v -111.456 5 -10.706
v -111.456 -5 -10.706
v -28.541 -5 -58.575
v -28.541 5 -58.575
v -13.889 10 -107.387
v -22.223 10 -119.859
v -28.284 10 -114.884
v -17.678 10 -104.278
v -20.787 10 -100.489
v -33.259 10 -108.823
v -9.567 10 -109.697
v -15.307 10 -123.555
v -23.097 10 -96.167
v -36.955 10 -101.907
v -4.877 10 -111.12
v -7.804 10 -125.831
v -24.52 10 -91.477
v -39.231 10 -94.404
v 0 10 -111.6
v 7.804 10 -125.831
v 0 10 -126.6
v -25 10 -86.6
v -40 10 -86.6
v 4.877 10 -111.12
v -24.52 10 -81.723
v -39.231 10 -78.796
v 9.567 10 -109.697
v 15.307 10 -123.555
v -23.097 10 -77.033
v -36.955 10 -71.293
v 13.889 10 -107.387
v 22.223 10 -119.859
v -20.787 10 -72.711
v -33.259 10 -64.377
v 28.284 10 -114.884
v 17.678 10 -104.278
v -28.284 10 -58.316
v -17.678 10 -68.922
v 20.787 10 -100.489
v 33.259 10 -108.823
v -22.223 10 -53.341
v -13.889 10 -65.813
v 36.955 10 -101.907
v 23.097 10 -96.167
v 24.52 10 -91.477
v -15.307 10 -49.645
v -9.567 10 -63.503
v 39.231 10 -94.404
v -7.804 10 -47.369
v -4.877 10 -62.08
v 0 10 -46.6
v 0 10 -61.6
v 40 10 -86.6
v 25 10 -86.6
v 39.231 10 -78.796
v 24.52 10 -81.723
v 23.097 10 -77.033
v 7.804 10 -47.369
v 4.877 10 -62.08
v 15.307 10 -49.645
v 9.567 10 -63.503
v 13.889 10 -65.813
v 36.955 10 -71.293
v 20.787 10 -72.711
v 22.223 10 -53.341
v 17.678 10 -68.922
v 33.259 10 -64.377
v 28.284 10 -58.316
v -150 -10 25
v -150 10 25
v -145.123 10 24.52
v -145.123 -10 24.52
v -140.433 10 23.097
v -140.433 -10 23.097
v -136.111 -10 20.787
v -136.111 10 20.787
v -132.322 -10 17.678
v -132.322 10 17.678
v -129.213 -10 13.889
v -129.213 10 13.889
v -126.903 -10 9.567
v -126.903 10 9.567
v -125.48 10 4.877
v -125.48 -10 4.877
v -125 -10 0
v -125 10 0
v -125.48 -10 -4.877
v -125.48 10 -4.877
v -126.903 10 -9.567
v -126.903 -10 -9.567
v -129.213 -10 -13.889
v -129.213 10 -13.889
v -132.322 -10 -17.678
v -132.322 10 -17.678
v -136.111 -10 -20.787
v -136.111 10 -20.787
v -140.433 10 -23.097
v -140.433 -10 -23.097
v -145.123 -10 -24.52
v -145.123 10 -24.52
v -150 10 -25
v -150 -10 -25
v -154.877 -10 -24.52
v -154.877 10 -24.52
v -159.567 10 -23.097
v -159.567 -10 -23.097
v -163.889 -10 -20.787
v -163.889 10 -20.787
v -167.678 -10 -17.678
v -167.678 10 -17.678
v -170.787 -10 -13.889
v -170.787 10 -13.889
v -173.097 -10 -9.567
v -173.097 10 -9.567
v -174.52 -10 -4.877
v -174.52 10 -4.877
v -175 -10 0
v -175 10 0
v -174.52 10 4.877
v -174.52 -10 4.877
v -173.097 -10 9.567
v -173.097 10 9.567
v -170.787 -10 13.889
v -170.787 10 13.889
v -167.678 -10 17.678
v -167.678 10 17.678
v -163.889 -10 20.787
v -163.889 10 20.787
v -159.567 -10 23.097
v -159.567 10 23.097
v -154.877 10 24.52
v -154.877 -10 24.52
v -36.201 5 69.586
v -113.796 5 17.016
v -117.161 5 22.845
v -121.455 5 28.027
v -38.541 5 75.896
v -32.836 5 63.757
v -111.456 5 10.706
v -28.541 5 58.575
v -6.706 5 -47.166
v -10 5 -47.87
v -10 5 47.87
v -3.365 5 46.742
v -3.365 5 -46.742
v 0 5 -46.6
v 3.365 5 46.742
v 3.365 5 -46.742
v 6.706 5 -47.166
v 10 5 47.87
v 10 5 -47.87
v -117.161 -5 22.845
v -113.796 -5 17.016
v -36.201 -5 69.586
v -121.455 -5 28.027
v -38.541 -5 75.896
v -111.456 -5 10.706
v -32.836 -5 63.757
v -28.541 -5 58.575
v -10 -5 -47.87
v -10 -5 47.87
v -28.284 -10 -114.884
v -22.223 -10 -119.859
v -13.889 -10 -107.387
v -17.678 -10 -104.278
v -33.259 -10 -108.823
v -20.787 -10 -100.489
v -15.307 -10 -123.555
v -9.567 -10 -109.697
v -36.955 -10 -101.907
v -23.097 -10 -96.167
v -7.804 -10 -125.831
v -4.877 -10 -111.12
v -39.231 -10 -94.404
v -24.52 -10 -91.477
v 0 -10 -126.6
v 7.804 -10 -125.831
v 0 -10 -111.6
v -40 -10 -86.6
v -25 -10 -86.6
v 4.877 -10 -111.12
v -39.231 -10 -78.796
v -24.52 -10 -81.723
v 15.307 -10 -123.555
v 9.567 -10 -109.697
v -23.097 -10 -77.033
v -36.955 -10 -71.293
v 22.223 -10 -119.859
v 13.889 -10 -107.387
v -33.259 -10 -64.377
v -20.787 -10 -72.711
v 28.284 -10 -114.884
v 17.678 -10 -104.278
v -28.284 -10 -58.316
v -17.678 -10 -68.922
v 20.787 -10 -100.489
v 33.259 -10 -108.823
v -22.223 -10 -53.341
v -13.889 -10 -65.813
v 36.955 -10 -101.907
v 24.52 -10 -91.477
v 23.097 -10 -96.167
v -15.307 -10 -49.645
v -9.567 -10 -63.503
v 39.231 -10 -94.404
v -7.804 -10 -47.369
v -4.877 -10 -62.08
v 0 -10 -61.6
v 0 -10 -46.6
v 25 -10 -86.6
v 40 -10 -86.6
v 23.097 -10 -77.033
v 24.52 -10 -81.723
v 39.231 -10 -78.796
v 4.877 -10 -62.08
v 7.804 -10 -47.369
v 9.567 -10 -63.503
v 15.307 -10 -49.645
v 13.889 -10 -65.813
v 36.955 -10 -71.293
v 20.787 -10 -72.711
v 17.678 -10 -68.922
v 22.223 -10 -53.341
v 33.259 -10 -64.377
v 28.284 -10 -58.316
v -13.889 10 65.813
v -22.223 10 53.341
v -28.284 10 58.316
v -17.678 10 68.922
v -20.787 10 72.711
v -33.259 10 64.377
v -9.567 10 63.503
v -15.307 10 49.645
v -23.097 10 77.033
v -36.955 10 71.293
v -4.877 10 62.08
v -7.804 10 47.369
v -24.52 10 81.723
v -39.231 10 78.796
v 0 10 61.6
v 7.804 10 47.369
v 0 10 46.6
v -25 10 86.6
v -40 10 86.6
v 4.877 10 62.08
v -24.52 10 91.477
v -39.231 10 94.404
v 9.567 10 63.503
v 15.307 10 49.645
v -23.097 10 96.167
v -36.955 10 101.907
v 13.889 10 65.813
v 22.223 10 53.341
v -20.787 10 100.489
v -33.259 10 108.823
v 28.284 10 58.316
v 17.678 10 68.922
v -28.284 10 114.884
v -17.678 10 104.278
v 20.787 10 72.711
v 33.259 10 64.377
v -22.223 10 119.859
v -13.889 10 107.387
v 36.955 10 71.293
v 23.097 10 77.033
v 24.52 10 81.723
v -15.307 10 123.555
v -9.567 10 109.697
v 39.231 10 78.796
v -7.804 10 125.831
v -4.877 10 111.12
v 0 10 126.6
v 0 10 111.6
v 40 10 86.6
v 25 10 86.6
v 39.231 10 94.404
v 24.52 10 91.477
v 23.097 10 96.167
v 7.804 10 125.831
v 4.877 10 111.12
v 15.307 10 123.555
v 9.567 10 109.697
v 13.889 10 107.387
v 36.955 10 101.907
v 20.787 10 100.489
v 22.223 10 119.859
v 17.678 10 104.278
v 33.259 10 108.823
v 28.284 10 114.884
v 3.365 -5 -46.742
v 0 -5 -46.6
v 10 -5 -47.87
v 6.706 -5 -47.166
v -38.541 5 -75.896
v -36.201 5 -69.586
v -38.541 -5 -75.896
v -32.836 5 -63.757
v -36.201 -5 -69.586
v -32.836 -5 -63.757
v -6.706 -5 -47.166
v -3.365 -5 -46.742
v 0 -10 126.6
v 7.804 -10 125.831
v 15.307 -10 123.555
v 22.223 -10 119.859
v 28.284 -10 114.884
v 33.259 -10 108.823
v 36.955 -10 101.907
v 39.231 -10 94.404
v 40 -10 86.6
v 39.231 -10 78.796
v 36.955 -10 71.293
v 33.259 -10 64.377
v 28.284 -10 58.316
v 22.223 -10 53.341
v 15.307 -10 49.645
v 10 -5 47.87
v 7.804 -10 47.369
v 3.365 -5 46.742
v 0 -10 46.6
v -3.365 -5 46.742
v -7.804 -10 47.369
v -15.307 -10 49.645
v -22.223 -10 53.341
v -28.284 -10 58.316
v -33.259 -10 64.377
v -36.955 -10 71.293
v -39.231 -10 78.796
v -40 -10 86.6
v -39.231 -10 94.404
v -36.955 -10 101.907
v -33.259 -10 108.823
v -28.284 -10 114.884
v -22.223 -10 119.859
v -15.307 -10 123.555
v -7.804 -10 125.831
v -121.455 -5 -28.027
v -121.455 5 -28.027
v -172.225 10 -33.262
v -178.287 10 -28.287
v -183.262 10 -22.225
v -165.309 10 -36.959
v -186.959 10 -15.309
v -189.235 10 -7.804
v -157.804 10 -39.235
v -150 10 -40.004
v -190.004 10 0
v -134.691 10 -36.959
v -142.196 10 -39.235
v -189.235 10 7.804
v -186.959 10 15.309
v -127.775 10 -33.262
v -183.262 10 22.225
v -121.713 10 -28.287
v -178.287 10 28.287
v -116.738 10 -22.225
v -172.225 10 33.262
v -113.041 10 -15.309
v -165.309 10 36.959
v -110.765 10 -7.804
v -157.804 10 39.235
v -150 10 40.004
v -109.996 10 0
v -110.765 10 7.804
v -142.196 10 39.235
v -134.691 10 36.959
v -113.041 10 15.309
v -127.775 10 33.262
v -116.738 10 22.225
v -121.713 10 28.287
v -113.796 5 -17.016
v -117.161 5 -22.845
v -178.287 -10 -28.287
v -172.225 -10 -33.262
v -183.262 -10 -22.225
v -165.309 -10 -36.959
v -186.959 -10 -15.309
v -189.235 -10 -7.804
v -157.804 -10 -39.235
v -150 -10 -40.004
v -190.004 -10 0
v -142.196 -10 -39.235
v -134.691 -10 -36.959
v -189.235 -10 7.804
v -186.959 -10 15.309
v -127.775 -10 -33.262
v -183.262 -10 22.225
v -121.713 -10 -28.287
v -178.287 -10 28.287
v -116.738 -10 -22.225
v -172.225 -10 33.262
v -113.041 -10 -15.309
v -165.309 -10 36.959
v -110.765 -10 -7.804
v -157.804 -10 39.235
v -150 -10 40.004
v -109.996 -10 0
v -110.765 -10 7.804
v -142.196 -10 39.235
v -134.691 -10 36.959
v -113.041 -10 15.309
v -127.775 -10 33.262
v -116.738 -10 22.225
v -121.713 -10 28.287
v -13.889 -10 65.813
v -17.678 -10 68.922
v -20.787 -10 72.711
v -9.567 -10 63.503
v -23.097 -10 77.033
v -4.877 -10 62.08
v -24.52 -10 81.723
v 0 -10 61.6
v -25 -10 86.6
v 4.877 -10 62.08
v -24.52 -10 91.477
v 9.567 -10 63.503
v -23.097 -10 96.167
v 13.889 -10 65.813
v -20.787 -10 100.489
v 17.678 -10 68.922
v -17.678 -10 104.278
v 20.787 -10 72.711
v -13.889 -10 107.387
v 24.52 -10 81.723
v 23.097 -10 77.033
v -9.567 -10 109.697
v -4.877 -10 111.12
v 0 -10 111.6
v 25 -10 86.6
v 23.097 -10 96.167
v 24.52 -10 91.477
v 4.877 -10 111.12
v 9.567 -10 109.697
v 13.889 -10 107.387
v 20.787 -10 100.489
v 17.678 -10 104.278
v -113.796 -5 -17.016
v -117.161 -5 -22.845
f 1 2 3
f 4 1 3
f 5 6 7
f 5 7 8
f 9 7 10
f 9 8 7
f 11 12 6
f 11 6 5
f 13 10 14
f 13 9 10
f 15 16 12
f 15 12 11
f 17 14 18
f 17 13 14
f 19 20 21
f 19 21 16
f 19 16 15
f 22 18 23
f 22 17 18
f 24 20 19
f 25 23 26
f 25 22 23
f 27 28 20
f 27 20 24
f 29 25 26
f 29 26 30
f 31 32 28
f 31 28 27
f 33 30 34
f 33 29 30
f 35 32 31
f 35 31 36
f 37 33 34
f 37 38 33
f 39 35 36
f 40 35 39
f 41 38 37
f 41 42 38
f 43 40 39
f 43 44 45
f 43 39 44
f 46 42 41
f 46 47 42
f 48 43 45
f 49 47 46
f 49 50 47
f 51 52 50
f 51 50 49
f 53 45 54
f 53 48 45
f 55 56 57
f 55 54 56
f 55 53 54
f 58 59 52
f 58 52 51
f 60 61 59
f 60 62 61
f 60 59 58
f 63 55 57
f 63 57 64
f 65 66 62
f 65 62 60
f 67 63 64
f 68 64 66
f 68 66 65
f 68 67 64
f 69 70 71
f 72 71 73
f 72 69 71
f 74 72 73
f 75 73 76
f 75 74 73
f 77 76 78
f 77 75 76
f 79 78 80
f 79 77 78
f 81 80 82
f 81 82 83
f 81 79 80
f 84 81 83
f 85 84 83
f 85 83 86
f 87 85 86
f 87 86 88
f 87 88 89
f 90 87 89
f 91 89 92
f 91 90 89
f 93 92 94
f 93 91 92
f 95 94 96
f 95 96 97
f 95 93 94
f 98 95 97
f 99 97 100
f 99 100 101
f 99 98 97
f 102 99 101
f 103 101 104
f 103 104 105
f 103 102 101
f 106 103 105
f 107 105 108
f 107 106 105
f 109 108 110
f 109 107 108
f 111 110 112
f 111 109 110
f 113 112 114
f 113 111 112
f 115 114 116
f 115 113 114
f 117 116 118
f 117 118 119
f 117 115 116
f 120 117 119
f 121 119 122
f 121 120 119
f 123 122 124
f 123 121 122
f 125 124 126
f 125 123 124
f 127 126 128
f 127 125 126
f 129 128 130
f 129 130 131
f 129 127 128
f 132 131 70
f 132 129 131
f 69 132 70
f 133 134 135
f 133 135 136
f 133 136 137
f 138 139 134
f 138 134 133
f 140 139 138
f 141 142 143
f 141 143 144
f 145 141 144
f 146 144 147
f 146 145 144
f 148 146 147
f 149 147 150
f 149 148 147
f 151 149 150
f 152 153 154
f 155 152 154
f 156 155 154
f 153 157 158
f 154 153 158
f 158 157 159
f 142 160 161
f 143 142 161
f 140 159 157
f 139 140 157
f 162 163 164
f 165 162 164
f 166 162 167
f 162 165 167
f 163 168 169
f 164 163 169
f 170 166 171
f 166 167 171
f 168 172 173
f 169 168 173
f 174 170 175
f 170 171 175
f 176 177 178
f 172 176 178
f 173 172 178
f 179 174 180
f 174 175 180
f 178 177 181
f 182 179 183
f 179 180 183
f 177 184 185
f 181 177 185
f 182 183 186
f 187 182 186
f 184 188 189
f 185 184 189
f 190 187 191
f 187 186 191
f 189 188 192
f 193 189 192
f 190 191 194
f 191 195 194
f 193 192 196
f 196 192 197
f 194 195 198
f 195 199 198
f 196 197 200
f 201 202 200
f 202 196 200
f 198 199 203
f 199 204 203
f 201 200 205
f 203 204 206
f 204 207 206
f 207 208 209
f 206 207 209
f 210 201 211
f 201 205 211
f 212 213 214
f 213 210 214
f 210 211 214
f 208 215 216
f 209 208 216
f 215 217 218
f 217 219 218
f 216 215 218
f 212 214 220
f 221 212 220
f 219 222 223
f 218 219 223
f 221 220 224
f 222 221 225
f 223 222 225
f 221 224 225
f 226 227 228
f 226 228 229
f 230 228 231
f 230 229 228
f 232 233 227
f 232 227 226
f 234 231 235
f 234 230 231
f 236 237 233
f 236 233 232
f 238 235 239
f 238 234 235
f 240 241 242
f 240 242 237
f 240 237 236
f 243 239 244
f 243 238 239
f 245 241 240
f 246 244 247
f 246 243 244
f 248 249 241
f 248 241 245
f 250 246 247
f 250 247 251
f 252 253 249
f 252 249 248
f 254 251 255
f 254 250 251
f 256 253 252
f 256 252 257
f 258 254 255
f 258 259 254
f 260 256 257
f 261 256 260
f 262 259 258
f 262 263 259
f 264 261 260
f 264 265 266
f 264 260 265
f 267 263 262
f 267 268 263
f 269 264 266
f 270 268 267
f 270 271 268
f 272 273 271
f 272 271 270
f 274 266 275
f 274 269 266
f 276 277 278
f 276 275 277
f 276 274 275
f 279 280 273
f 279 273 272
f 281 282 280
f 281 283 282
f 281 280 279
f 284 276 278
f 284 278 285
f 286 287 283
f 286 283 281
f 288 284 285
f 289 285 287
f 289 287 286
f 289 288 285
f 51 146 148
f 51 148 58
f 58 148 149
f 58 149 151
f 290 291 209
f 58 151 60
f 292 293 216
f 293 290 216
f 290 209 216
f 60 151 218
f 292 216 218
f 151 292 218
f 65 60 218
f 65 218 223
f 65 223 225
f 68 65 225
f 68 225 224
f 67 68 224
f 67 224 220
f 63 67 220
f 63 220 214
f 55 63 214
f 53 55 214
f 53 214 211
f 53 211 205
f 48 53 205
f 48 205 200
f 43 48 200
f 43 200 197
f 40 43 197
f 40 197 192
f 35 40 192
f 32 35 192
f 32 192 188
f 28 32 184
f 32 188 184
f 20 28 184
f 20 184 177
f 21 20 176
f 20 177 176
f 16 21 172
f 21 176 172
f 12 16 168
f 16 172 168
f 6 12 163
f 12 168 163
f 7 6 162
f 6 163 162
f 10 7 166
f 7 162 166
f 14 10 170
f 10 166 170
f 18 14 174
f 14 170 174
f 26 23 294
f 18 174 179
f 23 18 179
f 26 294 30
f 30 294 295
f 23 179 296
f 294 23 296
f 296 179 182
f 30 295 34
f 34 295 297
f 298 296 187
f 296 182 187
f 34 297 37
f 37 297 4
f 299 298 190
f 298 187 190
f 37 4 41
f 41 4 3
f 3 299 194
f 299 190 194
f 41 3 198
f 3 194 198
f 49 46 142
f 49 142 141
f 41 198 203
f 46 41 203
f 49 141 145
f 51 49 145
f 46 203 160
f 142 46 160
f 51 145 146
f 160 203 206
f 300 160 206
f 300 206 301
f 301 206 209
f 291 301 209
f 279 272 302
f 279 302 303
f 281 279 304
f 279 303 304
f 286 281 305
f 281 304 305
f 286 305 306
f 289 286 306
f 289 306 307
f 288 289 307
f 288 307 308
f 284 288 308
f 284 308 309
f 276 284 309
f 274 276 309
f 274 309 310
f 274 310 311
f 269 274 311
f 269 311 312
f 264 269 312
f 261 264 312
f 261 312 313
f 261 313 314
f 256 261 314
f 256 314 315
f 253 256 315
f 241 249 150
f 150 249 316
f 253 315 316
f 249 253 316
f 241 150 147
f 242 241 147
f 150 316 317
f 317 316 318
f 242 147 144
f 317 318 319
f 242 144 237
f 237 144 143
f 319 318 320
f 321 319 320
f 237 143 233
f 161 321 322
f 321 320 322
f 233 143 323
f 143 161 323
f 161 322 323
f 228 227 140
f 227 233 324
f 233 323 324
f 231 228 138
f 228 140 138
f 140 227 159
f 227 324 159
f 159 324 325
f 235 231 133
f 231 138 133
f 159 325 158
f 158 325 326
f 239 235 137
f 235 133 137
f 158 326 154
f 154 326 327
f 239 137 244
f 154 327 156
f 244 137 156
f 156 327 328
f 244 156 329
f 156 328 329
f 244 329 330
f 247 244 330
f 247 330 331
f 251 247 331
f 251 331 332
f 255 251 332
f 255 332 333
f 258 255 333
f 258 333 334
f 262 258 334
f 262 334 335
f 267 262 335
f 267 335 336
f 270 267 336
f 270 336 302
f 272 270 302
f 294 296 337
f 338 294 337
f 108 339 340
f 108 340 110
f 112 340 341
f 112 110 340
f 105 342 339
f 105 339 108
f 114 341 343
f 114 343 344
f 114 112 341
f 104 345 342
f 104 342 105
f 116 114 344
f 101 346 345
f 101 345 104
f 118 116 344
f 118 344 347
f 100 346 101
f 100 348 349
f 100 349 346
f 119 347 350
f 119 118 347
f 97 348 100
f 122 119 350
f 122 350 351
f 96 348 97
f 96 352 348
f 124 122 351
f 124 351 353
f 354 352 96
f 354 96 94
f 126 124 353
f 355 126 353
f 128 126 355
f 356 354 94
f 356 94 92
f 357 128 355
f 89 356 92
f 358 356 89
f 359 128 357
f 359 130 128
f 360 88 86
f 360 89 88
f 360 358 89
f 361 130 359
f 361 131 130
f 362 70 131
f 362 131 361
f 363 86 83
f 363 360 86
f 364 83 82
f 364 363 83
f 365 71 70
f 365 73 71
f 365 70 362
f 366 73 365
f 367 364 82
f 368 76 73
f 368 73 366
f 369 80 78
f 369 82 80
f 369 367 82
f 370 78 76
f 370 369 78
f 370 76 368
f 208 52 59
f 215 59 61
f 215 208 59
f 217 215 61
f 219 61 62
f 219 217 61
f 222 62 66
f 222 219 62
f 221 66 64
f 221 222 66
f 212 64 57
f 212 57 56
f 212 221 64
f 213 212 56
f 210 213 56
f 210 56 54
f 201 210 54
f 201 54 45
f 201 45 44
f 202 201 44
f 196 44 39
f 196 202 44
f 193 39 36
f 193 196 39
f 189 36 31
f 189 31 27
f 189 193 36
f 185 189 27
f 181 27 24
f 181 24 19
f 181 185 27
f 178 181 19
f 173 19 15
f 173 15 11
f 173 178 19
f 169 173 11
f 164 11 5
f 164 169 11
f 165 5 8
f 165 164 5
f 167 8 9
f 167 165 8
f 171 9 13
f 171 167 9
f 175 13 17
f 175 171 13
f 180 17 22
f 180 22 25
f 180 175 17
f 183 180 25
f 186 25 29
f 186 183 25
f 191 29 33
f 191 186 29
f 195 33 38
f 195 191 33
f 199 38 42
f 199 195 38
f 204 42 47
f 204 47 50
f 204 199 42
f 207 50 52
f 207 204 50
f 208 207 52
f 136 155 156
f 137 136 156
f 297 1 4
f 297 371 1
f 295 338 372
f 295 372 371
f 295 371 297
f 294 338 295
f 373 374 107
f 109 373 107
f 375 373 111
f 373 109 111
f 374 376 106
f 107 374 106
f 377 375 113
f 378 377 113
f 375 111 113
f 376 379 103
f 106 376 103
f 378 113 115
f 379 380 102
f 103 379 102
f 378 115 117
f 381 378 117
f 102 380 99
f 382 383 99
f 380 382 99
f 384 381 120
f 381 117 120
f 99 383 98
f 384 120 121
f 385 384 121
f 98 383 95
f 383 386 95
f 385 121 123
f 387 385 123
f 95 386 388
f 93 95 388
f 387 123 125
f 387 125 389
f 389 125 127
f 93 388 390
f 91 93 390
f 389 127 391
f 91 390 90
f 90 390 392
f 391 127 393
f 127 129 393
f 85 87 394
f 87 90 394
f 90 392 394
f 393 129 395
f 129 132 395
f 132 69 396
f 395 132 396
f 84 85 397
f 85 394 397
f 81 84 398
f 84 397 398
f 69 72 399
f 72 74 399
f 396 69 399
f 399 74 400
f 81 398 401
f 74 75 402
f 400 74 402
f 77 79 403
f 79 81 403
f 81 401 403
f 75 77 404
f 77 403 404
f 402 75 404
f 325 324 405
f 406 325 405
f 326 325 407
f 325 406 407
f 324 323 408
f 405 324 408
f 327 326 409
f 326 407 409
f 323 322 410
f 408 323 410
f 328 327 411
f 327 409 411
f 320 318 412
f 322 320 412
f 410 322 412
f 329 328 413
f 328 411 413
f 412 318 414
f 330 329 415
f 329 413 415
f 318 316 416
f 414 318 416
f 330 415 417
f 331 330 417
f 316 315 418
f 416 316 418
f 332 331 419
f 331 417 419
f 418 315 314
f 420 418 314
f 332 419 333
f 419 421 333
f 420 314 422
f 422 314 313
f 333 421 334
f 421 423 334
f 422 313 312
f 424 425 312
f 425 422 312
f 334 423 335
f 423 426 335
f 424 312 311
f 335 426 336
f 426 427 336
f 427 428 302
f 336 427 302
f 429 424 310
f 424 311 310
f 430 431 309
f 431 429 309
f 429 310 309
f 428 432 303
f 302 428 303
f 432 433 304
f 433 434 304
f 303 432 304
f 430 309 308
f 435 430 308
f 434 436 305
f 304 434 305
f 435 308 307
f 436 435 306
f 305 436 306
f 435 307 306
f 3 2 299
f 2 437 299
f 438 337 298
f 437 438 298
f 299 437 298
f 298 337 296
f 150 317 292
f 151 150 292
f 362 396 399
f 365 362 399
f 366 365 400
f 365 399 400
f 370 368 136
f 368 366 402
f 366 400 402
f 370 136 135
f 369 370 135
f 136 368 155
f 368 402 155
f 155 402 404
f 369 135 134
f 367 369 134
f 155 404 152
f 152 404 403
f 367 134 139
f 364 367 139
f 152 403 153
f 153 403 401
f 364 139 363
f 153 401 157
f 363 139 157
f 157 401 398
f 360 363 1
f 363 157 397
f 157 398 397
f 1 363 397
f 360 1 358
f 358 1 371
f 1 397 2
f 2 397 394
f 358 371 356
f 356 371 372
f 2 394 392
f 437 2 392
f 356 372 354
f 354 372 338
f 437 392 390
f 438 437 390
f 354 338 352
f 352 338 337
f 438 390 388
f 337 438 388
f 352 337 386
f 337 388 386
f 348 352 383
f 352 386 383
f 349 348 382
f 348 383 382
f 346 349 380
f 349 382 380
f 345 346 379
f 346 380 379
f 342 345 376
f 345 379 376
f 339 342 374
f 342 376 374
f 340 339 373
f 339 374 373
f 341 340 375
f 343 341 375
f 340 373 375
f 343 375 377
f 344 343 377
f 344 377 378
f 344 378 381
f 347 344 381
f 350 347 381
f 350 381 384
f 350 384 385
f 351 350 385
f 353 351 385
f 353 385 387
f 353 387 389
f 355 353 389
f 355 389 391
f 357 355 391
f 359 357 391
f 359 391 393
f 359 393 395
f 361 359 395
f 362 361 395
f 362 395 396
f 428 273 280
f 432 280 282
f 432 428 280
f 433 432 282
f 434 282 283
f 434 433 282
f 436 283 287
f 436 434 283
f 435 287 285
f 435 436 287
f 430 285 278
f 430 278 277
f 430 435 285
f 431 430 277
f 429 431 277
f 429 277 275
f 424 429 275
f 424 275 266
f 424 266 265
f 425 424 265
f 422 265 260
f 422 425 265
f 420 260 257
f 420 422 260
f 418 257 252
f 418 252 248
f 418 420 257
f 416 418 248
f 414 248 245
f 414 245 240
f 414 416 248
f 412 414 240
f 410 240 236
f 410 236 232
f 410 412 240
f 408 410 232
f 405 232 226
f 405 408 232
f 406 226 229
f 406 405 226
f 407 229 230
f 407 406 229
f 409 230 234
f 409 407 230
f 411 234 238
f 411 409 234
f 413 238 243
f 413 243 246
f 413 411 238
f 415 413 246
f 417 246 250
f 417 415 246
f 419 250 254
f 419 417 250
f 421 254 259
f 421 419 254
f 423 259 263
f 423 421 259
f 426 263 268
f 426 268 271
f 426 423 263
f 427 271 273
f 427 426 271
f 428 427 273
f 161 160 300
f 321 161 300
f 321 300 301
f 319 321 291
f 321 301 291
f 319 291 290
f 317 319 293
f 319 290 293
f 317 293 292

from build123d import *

# Parameters (mm, degrees)
Y_KSEKLIK_EKSTR_ZYON4_DEPTH        = 10
Y_KSEKLIK_EKSTR_ZYON4_DEPTH_BACK   = 10
IZIM1_R                            = 40
IZIM1_R_2                          = 25
Y_KSEKLIK_EKSTR_ZYON4_2_DEPTH      = 10
Y_KSEKLIK_EKSTR_ZYON4_2_DEPTH_BACK = 10
Y_KSEKLIK_EKSTR_ZYON4_3_DEPTH      = 10
Y_KSEKLIK_EKSTR_ZYON4_3_DEPTH_BACK = 10
IZIM1_R_3                          = 40.003689591
Y_KSEKLIK_EKSTR_ZYON5_DEPTH        = 5
Y_KSEKLIK_EKSTR_ZYON5_DEPTH_BACK   = 5


with BuildPart() as part:
    # Çizim1 → Yükseklik-Ekstrüzyon4 (new, two sides: drawn at the far end of the back side and taken through both)
    with BuildSketch(Plane(origin=(0, 0, 0), x_dir=(1, 0, 0), z_dir=(0, 1, 0)).offset(-Y_KSEKLIK_EKSTR_ZYON4_DEPTH_BACK)):
        with Locations((0, 86.6)):
            Circle(IZIM1_R)
        with Locations((0, 86.6)):
            Circle(IZIM1_R_2, mode=Mode.SUBTRACT)
    extrude(amount=Y_KSEKLIK_EKSTR_ZYON4_DEPTH + Y_KSEKLIK_EKSTR_ZYON4_DEPTH_BACK)



with BuildPart() as body_2:
    # Çizim1 → Y_kseklik-Ekstr_zyon4 2 (new, two sides: drawn at the far end of the back side and taken through both)
    with BuildSketch(Plane(origin=(0, 0, 0), x_dir=(1, 0, 0), z_dir=(0, 1, 0)).offset(-Y_KSEKLIK_EKSTR_ZYON4_2_DEPTH_BACK)):
        with Locations((0, -86.6)):
            Circle(IZIM1_R)
        with Locations((0, -86.6)):
            Circle(IZIM1_R_2, mode=Mode.SUBTRACT)
    extrude(amount=Y_KSEKLIK_EKSTR_ZYON4_2_DEPTH + Y_KSEKLIK_EKSTR_ZYON4_2_DEPTH_BACK)


with BuildPart() as body_3:
    # Çizim1 → Y_kseklik-Ekstr_zyon4 3 (new, two sides: drawn at the far end of the back side and taken through both)
    with BuildSketch(Plane(origin=(0, 0, 0), x_dir=(1, 0, 0), z_dir=(0, 1, 0)).offset(-Y_KSEKLIK_EKSTR_ZYON4_3_DEPTH_BACK)):
        with Locations((-150, 0)):
            Circle(IZIM1_R_3)
        with Locations((-150, 0)):
            Circle(IZIM1_R_2, mode=Mode.SUBTRACT)
    extrude(amount=Y_KSEKLIK_EKSTR_ZYON4_3_DEPTH + Y_KSEKLIK_EKSTR_ZYON4_3_DEPTH_BACK)


with BuildPart() as part_1:
    add(part.part)

    add(body_2.part)  # Yükseklik-Ekstrüzyon5 merges body 2

    add(body_3.part)  # Yükseklik-Ekstrüzyon5 merges body 3
    # Çizim1<6> → Yükseklik-Ekstrüzyon5 (add, two sides: drawn at the far end of the back side and taken through both)
    with BuildSketch(Plane(origin=(0, 0, 0), x_dir=(1, 0, 0), z_dir=(0, 1, 0)).offset(-Y_KSEKLIK_EKSTR_ZYON5_DEPTH_BACK)):
        with BuildLine():
            ThreePointArc((10, 47.870166538), (0, 46.6), (-10, 47.870166538))
            Line((-10, 47.870166538), (-10, -47.870166538))
            ThreePointArc((-10, -47.870166538), (0, -46.6), (10, -47.870166538))
            Line((10, -47.870166538), (10, 47.870166538))
        make_face()
        with BuildLine():
            Line((-111.455544285, 10.706078394), (-28.541375636, 58.575191761))
            ThreePointArc((-28.541375636, 58.575191761), (-34.641270188, 66.600440011), (-38.54115563, 75.895826855))
            Line((-38.54115563, 75.895826855), (-121.45532428, 28.026713488))
            ThreePointArc((-121.45532428, 28.026713488), (-115.355534509, 20.001404744), (-111.455544285, 10.706078394))
        make_face()
        with BuildLine():
            ThreePointArc((-38.54115563, -75.895826855), (-34.641270188, -66.600440011), (-28.541375636, -58.575191761))
            Line((-28.541375636, -58.575191761), (-111.455544285, -10.706078394))
            ThreePointArc((-111.455544285, -10.706078394), (-115.355534509, -20.001404744), (-121.45532428, -28.026713488))
            Line((-121.45532428, -28.026713488), (-38.54115563, -75.895826855))
        make_face()
    extrude(amount=Y_KSEKLIK_EKSTR_ZYON5_DEPTH + Y_KSEKLIK_EKSTR_ZYON5_DEPTH_BACK)


solid = part_1.part
